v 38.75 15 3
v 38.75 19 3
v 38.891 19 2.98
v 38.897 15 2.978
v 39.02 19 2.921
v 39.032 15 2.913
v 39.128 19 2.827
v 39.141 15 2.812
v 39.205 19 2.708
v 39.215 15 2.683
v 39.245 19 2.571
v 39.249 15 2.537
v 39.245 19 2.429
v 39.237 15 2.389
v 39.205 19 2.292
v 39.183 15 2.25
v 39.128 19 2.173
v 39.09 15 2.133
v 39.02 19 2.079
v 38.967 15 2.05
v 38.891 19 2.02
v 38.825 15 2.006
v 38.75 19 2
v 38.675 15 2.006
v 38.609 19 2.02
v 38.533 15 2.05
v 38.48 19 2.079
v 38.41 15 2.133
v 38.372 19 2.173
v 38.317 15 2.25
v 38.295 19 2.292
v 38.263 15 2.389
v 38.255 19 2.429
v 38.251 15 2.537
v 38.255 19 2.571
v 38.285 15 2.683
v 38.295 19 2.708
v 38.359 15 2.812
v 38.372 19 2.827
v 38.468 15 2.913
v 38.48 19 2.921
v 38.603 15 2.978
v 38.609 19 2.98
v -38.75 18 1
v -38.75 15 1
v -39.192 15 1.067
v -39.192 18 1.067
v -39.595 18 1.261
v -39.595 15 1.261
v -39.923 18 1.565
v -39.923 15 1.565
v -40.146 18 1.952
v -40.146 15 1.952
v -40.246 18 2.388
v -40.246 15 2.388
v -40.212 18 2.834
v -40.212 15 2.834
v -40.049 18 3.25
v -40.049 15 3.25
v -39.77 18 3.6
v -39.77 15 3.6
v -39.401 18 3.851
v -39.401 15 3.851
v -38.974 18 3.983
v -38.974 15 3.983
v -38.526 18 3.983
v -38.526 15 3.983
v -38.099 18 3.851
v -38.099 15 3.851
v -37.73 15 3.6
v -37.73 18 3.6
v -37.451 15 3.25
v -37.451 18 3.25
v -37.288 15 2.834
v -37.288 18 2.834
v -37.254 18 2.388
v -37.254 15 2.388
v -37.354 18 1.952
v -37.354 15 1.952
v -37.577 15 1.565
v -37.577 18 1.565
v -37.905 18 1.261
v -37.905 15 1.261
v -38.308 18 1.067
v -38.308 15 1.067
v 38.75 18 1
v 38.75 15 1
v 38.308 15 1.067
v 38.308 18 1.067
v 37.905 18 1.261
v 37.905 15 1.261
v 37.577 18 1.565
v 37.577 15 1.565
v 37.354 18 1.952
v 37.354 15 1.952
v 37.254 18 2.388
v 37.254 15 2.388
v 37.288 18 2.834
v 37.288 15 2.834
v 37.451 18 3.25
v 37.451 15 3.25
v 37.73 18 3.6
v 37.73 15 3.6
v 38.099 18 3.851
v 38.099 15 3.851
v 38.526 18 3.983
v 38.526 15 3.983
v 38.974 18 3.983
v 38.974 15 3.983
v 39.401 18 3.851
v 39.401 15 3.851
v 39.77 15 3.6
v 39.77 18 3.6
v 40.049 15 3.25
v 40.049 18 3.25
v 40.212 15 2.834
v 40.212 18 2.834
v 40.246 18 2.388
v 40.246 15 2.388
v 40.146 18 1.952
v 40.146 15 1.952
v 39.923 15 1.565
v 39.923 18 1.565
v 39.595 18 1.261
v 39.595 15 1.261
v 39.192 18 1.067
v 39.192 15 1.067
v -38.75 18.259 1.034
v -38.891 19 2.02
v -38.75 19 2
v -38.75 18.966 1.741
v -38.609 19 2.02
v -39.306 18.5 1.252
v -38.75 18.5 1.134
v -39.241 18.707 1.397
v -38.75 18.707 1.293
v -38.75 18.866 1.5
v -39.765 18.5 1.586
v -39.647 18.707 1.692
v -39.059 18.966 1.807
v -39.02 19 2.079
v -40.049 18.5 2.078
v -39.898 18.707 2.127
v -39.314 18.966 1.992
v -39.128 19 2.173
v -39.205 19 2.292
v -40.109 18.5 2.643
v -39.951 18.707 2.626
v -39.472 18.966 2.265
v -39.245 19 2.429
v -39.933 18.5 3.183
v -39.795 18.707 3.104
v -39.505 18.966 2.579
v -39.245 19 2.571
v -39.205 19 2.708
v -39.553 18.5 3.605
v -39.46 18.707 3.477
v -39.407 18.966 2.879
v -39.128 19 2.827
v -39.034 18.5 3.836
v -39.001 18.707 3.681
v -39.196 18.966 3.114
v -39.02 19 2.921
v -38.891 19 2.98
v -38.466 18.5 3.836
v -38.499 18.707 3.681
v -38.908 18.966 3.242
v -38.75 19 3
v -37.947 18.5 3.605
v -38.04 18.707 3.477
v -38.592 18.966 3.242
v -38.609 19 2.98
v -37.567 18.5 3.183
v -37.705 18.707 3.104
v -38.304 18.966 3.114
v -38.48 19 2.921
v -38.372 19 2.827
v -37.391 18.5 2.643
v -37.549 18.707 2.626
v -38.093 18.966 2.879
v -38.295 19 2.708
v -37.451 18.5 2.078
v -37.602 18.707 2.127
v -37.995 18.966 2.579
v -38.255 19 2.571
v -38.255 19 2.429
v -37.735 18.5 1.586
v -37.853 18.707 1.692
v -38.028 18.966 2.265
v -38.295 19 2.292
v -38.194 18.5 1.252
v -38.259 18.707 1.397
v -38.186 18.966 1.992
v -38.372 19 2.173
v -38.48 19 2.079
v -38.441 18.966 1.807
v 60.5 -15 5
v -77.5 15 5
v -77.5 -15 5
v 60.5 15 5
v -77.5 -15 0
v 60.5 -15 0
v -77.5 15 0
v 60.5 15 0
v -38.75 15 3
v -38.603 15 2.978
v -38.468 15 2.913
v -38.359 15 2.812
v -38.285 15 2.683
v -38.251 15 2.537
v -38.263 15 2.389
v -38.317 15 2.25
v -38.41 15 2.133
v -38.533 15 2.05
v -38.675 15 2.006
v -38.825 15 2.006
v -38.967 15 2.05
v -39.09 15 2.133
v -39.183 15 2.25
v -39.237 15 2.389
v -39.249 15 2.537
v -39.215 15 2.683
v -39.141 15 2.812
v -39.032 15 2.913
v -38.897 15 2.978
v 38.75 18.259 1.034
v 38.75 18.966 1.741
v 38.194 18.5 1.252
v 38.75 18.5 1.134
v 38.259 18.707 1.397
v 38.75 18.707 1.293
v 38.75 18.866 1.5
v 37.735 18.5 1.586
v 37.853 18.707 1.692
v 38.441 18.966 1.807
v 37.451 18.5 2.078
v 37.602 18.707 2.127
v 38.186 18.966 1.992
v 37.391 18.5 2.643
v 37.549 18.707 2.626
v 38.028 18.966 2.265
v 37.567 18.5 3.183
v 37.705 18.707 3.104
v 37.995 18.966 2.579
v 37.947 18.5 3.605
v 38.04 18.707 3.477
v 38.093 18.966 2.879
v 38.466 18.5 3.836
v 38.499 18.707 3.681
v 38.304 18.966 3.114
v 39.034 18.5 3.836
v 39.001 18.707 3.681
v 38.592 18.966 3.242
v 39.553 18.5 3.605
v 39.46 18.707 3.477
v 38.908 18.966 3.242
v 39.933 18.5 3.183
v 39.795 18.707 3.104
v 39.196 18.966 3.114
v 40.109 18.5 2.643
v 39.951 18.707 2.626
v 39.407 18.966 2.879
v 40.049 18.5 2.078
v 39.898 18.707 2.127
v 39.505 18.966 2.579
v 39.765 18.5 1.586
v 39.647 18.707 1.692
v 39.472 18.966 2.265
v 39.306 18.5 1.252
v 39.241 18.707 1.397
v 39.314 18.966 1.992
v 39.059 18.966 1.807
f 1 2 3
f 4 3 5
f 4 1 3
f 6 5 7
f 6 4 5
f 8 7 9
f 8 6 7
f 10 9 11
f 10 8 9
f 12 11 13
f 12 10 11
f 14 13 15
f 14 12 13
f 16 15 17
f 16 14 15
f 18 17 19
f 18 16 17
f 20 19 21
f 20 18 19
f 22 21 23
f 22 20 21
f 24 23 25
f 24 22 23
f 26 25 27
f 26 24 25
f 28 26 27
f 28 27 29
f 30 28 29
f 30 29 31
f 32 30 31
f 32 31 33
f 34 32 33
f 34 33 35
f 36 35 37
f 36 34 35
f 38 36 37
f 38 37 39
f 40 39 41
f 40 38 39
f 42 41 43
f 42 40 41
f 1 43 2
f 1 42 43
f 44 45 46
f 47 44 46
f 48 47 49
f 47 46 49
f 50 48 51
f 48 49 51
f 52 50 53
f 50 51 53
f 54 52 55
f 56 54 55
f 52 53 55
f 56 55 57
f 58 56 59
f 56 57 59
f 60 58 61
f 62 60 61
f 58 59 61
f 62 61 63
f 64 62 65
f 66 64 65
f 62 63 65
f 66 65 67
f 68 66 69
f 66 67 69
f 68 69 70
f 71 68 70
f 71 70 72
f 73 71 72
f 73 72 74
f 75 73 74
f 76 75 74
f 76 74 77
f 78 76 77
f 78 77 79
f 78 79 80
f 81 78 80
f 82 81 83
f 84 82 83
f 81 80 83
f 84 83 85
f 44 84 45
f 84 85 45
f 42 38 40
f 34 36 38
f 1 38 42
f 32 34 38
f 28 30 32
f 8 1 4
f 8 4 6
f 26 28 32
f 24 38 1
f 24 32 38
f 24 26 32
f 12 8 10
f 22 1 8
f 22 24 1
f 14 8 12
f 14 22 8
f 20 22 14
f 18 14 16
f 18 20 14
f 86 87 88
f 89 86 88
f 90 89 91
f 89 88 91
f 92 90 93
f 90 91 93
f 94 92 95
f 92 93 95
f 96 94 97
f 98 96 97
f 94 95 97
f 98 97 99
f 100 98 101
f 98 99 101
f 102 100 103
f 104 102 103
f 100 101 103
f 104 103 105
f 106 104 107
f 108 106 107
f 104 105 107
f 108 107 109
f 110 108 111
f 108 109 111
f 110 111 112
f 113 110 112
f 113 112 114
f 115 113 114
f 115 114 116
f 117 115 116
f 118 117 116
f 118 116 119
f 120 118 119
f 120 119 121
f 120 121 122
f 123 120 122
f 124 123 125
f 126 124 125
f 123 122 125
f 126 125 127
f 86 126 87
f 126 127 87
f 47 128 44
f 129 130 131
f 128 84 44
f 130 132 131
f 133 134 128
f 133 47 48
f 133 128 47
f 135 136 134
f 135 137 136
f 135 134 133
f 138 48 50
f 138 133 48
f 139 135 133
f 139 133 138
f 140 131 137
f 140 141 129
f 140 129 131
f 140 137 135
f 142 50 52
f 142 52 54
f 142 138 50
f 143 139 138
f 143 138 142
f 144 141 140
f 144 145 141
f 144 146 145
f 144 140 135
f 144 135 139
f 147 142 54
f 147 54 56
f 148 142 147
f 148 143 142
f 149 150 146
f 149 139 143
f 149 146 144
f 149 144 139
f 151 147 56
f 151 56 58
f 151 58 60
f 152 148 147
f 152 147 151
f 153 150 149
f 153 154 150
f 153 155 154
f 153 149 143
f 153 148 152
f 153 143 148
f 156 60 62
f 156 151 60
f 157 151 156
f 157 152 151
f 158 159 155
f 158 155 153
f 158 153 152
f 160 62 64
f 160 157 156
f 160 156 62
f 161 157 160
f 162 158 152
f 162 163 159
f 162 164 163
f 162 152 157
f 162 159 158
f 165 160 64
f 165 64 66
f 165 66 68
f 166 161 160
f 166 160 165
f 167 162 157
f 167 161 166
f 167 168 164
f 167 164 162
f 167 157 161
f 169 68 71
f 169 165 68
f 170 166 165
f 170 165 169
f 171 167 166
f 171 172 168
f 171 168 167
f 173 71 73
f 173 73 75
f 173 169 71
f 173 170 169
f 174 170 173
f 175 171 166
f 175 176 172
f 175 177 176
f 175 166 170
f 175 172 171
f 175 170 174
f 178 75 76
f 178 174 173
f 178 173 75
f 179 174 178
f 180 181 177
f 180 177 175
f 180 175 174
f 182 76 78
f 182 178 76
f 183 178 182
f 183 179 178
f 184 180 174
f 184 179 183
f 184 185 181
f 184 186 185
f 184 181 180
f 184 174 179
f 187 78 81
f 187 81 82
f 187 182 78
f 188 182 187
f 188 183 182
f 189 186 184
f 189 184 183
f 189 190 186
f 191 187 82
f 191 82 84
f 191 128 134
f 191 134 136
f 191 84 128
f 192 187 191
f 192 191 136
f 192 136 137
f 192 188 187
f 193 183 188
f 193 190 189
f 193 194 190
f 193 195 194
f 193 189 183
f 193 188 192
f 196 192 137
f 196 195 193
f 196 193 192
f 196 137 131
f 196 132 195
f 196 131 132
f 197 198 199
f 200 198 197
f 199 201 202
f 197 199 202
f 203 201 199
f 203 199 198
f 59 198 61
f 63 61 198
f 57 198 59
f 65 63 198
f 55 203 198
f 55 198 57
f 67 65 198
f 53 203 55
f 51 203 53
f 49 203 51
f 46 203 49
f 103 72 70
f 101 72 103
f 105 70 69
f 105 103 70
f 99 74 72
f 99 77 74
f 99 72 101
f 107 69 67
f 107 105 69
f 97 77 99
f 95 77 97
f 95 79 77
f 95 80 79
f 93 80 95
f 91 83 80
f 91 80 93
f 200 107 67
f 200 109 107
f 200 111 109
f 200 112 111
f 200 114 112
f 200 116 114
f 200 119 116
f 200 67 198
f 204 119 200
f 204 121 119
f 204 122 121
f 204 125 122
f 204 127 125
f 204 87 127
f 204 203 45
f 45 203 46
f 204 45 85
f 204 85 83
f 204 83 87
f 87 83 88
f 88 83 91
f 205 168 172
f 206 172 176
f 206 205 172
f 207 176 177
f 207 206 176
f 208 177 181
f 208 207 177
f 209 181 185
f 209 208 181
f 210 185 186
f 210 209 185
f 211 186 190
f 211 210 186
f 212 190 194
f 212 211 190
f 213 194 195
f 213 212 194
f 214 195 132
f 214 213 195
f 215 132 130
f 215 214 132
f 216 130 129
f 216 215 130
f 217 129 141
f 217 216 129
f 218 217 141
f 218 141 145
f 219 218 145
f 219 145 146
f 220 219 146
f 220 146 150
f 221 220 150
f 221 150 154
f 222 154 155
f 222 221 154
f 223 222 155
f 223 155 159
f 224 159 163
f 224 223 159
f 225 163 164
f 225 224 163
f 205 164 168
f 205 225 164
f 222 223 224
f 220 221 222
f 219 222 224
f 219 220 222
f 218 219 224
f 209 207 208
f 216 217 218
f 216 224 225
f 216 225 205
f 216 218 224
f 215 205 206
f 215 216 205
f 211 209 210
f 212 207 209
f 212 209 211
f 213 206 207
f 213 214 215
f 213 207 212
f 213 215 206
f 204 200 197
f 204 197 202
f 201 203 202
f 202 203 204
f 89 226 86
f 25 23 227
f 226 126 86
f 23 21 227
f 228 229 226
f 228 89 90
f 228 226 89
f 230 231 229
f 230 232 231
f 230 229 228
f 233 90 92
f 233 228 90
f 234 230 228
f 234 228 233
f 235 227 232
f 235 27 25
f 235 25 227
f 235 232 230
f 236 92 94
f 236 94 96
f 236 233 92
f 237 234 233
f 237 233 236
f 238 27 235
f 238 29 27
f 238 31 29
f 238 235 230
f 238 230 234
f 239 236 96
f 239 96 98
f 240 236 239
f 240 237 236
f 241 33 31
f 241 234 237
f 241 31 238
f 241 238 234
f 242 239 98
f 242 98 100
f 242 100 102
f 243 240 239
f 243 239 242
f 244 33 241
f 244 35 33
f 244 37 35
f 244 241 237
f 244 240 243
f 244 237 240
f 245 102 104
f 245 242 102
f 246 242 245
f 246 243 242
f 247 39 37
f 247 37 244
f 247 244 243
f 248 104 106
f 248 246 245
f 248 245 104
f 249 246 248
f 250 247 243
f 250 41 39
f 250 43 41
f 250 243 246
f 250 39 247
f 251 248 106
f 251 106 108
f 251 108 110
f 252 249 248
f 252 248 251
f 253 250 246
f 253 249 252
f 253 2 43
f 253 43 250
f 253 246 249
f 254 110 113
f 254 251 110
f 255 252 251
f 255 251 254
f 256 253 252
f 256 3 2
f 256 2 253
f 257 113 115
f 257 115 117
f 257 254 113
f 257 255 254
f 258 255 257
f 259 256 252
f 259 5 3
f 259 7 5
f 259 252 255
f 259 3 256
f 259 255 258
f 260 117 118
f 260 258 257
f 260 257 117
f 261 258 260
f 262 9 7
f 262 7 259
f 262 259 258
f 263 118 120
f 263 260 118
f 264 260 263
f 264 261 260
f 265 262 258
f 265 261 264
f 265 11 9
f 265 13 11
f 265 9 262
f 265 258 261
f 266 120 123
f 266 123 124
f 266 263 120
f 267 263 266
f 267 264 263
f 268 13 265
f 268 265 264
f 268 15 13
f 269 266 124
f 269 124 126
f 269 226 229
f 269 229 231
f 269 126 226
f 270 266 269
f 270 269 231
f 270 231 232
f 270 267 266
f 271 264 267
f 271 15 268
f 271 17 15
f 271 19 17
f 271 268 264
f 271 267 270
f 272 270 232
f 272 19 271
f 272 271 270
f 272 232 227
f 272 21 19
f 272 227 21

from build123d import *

# Parameters (mm, degrees)
ESQUISSE1_W             = 155
ESQUISSE1_H             = 30
BOSS_EXTRU_1_DEPTH      = 5
ESQUISSE2_R             = 1.5
ESQUISSE2_R_2           = 0.5
BOSS_EXTRU_2_DEPTH      = 4
CONG_1_R                = 1
ESQUISSE4_W             = 5
ESQUISSE4_H             = 30
ENL_V_MAT_EXTRU_2_DEPTH = 17


with BuildPart() as part:
    # Esquisse1 → Boss.-Extru.1 (new body)
    with BuildSketch(Plane.XY):
        Rectangle(ESQUISSE1_W, ESQUISSE1_H)
    extrude(amount=BOSS_EXTRU_1_DEPTH)

    # Esquisse2 → Boss.-Extru.2 (add)
    # profile 1 of 2: a face of its own
    with BuildSketch(Plane(origin=(0, 15, 0), x_dir=(1, 0, 0), z_dir=(0, 1, 0))):
        with Locations(Location((-38.75, -2.5, 0), (0, 0, 90))):
            Circle(ESQUISSE2_R)
        with Locations(Location((-38.75, -2.5, 0), (0, 0, 270))):
            Circle(ESQUISSE2_R_2, mode=Mode.SUBTRACT)
    # profile 2 of 2: a face of its own
    with BuildSketch(Plane(origin=(0, 15, 0), x_dir=(1, 0, 0), z_dir=(0, 1, 0))):
        with Locations(Location((38.75, -2.5, 0), (0, 0, 90))):
            Circle(ESQUISSE2_R)
        with Locations(Location((38.75, -2.5, 0), (0, 0, 270))):
            Circle(ESQUISSE2_R_2, mode=Mode.SUBTRACT)
    extrude(amount=BOSS_EXTRU_2_DEPTH)

    # Congé1
    cong_1_edges = [part.edges().sort_by_distance(p)[0] for p in [
        (-38.75, 19, 4),
        (38.75, 19, 4),
    ]]
    fillet(cong_1_edges, radius=CONG_1_R - 0.0001)  # a hair under: the kernel refuses the full size

    # Esquisse4 → Enlèv. mat.-Extru.2 (cut)
    with BuildSketch(Plane(origin=(77.5, 0, 0), x_dir=(0, 0, -1), z_dir=(1, 0, 0))):
        with Locations((-2.5, 0)):
            Rectangle(ESQUISSE4_W, ESQUISSE4_H)
    extrude(amount=-ENL_V_MAT_EXTRU_2_DEPTH, mode=Mode.SUBTRACT)


solid = part.part
